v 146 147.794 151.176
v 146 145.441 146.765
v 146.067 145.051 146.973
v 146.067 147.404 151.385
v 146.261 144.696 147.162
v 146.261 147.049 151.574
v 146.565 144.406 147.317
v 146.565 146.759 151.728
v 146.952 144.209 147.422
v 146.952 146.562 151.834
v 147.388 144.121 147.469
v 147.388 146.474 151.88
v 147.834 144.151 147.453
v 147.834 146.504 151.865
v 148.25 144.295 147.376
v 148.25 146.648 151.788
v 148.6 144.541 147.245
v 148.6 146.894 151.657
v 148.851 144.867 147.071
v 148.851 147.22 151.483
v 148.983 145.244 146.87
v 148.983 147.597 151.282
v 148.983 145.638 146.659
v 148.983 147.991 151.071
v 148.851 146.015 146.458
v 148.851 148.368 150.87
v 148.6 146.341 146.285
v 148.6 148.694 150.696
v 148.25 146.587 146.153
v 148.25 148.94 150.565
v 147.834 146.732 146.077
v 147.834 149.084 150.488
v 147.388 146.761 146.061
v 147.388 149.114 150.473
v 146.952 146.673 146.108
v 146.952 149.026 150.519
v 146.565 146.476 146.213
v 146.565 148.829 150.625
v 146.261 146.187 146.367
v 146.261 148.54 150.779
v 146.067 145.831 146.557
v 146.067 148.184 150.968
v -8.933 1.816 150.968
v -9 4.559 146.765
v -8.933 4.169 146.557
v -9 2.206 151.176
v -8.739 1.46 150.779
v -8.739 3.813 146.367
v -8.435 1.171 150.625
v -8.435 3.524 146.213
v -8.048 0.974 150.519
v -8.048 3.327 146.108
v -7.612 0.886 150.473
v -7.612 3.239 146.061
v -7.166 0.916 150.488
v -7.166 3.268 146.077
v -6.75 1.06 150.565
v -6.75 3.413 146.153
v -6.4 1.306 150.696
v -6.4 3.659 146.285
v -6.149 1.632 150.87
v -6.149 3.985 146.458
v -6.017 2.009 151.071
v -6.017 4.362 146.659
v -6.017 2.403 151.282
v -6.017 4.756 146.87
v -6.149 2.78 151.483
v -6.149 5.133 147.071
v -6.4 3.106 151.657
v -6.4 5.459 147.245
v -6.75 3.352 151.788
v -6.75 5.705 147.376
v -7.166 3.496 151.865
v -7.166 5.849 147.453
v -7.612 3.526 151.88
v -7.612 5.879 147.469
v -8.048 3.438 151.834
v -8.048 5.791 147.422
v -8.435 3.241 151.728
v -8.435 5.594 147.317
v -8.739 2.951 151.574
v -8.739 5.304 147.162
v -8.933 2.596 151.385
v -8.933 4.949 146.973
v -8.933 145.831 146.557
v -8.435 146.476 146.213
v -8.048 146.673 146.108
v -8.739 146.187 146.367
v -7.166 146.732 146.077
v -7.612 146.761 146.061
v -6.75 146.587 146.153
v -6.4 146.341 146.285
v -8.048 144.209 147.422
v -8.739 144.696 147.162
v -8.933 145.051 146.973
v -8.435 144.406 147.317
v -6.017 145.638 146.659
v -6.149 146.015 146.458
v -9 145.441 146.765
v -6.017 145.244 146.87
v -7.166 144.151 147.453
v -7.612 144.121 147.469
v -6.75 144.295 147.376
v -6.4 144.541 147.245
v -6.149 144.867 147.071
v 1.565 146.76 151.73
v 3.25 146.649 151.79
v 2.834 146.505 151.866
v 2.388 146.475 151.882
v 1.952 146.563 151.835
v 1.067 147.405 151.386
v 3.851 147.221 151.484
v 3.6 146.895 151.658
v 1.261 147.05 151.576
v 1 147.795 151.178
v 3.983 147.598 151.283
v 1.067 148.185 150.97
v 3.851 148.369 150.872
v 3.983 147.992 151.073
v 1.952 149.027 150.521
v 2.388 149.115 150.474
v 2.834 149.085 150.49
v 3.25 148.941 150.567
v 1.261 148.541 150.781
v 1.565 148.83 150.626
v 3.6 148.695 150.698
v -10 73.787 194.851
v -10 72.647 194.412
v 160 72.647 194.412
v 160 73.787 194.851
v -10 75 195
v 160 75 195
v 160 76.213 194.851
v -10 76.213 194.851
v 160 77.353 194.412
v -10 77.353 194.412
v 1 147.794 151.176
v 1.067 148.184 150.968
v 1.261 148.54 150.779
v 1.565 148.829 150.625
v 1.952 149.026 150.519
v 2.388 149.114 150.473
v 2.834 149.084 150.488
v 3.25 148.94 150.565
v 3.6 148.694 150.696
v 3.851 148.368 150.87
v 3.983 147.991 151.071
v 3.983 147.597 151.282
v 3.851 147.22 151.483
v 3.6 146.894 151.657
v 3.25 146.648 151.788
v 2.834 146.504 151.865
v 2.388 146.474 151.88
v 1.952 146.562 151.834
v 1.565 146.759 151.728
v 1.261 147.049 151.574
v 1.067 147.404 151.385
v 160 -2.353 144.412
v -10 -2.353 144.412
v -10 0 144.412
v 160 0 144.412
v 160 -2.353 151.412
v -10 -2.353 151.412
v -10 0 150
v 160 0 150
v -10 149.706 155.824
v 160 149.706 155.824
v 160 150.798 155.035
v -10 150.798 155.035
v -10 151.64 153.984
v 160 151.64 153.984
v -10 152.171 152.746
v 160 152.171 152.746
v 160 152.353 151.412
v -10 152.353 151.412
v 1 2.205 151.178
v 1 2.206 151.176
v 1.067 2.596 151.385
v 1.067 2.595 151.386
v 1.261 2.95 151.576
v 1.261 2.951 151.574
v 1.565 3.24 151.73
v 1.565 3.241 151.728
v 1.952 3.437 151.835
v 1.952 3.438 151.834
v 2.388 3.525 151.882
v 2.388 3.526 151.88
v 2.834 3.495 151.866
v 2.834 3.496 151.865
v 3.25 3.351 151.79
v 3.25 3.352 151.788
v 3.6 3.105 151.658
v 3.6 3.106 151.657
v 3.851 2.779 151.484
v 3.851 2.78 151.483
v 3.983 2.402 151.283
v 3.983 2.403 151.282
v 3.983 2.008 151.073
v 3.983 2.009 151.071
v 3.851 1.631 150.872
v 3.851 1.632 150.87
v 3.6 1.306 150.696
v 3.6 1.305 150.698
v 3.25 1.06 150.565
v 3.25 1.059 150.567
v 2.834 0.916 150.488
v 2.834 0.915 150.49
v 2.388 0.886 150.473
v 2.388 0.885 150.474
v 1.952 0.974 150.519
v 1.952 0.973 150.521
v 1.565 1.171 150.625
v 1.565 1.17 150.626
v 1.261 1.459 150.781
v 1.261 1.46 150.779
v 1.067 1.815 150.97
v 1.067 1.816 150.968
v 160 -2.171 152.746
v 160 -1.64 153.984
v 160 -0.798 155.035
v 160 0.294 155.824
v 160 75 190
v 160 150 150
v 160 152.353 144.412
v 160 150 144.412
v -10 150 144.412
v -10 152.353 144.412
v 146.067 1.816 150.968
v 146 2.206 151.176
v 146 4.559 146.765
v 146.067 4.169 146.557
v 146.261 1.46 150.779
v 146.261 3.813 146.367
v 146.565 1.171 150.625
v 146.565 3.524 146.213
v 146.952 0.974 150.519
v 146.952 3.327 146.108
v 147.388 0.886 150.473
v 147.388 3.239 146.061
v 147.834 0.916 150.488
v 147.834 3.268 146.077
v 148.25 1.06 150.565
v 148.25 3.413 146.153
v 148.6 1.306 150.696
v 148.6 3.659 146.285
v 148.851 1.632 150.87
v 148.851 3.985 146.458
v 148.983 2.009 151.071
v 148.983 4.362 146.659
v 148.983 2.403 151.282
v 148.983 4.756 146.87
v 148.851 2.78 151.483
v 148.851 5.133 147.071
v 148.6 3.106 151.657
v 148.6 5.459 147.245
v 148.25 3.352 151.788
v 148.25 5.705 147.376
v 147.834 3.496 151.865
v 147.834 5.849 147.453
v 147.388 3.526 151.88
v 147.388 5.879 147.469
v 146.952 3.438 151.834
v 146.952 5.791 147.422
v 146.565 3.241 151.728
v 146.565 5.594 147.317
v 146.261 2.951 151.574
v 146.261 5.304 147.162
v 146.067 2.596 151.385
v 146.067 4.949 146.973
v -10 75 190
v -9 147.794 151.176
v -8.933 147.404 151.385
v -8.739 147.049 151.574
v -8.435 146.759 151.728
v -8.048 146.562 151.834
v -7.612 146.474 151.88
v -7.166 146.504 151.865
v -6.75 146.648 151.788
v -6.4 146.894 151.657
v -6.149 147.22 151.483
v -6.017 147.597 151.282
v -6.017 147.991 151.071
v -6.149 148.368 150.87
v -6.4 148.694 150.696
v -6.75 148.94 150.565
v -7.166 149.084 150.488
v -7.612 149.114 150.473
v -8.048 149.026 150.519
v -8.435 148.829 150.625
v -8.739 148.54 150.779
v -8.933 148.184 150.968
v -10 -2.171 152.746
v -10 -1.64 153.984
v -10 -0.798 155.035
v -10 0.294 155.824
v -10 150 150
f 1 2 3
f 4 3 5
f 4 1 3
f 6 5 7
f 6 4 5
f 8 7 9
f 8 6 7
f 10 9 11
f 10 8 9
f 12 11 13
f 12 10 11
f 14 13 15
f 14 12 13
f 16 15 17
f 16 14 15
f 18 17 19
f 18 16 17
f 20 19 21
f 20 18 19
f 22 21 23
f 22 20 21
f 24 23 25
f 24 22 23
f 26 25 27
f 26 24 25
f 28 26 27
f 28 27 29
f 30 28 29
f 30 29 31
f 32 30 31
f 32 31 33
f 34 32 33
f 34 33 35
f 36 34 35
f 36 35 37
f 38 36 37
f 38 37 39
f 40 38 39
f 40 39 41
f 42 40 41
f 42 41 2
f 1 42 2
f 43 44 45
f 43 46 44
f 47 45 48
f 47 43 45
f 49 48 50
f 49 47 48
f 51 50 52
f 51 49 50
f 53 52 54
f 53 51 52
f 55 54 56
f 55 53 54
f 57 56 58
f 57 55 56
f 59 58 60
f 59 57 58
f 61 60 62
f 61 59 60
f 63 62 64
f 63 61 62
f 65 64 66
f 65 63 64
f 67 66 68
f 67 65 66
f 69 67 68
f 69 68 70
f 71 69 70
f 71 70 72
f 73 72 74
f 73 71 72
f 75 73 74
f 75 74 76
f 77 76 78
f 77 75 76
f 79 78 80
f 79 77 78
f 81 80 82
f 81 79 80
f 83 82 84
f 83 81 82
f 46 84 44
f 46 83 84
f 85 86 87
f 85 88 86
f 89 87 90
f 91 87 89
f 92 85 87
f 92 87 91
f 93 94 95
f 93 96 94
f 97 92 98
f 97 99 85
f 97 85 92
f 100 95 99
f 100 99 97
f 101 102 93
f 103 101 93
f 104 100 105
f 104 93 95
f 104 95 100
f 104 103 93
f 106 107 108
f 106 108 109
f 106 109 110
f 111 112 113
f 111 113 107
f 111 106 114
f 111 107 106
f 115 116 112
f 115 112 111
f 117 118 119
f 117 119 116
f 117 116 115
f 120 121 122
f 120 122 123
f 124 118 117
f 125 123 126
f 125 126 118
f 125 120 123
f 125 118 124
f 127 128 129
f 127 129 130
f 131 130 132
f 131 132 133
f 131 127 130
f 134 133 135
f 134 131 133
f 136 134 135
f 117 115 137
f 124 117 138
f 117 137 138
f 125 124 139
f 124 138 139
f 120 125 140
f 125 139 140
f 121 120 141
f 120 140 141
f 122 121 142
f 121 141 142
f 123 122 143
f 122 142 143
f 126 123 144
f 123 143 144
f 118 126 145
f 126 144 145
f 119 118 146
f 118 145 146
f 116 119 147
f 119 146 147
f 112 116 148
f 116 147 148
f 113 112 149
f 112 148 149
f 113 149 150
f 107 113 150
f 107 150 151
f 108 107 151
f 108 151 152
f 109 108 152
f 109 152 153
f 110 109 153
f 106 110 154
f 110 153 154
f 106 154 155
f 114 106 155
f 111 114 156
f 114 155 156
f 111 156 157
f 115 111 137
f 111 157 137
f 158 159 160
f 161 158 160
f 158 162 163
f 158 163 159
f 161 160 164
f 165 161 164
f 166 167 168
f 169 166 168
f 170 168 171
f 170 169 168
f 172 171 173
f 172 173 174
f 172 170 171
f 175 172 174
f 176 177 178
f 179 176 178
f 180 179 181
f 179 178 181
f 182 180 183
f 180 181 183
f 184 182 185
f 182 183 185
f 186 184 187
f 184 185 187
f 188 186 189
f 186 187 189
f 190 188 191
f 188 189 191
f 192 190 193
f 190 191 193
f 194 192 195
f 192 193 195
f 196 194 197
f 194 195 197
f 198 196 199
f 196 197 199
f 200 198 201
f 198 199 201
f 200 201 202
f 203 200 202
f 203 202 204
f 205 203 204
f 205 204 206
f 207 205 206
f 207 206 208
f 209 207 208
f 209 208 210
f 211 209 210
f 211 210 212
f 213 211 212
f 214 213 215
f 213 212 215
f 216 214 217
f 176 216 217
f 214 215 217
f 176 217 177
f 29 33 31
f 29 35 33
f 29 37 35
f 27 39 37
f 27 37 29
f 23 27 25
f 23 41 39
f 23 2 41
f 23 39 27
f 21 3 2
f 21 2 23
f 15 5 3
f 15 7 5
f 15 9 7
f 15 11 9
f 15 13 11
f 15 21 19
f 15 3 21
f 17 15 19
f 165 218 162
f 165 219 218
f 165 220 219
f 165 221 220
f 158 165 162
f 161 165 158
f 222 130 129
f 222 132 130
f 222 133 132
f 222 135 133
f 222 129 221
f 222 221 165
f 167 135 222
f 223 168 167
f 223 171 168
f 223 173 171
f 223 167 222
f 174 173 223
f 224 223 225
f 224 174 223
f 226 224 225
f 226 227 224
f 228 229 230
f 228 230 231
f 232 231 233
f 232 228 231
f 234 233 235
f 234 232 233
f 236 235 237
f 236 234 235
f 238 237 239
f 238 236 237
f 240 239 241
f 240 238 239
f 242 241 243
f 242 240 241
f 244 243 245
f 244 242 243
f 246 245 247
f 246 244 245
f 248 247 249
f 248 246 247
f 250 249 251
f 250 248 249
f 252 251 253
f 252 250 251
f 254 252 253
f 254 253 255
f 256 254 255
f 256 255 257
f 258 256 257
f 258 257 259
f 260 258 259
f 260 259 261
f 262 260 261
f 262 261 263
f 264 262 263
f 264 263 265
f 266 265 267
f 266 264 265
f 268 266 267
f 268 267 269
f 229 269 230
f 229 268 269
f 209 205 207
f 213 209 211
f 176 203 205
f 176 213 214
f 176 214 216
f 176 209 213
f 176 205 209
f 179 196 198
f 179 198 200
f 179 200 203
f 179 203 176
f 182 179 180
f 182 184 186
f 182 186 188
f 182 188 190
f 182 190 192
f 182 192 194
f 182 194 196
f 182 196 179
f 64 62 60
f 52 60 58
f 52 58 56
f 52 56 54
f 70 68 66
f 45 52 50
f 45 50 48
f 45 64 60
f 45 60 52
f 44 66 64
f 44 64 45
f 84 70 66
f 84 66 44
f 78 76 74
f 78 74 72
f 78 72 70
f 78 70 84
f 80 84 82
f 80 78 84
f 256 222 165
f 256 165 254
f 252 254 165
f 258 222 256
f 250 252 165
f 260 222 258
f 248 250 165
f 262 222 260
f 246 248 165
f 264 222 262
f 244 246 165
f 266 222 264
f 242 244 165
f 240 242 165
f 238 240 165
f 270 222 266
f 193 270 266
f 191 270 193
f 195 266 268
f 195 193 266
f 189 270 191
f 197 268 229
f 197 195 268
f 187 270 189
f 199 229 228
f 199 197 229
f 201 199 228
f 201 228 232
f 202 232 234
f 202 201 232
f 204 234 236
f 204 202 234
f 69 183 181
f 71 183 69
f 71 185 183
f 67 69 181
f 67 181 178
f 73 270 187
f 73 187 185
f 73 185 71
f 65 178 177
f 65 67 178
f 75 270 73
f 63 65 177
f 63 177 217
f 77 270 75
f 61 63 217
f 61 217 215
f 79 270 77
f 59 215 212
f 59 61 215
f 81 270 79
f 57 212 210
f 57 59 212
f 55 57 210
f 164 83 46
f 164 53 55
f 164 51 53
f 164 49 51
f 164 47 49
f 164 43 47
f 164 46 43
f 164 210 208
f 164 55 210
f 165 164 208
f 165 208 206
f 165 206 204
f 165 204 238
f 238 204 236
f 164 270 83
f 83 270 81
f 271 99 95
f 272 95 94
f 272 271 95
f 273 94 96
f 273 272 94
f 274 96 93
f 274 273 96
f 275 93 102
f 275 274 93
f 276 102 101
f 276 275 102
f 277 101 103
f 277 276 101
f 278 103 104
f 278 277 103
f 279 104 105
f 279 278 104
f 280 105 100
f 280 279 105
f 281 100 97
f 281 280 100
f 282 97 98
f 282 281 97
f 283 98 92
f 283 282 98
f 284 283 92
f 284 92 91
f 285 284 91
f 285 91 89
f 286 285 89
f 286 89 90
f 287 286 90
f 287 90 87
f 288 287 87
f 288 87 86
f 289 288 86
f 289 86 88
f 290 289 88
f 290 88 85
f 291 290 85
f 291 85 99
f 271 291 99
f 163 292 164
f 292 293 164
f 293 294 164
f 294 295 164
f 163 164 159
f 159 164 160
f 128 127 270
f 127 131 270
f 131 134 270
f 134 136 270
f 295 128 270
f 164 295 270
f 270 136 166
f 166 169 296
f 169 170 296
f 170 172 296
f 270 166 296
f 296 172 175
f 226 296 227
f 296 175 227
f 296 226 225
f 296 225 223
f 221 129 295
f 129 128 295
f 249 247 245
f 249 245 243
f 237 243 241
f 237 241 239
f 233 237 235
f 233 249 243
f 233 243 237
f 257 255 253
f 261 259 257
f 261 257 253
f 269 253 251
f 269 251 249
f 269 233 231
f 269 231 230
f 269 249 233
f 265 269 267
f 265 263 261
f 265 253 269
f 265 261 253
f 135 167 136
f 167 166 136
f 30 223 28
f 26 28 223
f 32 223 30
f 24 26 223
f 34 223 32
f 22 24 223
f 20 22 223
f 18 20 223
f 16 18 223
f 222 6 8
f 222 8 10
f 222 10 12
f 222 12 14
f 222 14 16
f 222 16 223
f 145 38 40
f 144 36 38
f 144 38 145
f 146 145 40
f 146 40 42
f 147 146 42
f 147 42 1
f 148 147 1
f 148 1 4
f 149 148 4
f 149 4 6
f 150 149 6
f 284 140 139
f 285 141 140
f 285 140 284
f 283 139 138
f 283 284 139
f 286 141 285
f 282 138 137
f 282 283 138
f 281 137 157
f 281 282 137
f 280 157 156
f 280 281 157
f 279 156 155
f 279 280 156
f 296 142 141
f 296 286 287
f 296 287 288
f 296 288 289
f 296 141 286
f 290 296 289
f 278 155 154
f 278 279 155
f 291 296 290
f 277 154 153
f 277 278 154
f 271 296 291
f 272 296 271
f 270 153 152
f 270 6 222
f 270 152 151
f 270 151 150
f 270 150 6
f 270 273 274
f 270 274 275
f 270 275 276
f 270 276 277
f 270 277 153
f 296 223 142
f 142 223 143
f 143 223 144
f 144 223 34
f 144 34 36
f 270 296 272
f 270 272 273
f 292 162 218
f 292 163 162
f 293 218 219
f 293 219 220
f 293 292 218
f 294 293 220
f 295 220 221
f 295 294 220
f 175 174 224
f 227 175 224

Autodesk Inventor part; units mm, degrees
sketch "Boceto1" plane through (0, 0, 0) normal (0, 0, 1) x (1, 0, 0)
  line L0 (0, 0) -> (150, 0)
  line L1 (150, 0) -> (150, 150)
  line L2 (150, 150) -> (0, 150)
  line L3 (0, 150) -> (0, 0)
  line L4 (5, 145) -> (145, 145)
  line L5 (145, 145) -> (145, 5)
  line L6 (145, 5) -> (5, 5)
  line L7 (5, 5) -> (5, 145)
  dimension "d0" = 150
  dimension "d1" = 150
  dimension "d2" = 5
extrude "Extrusión1" add sketch "Boceto1" along normal blind 150
sketch "Boceto2" plane through (150, 0, 0) normal (1, 0, 0) x (0, 0, -1)
  line L0 (-150, 0) -> (-150, 150) projected
  line L1 (-150, 75) -> (-190, 75) construction
  line L2 (-190, 75) -> (-150, 150)
  line L3 (0, 0) -> (-150, 0) construction
  line L4 (-150, 0) -> (-190, 75)
  dimension "d5" = 40
extrude "Extrusión2" add sketch "Boceto2" against normal blind 5
ref_plane "Plano de trabajo1" through (75, 0, 0) normal (1, 0, 0) x (0, 0, -1)
mirror "Simetría1" about plane through (75, 0, 0) normal (1, 0, 0) of "Extrusión2"
sketch "Boceto3" plane through (0, 150, 0) normal (0, 1, 0) x (1, 0, 0)
  line L0 (105, -60) -> (45, -60)
  line L1 (45, -60) -> (45, -95)
  line L2 (60, -110) -> (90, -110)
  line L3 (105, -95) -> (105, -60)
  line L4 (150, 0) -> (0, 0) projected
  line L5 (145, -150) -> (5, -150) projected
  arc A0 (90, -110) -> (105, -95) centre (90, -95) ccw
  arc A1 (45, -95) -> (60, -110) centre (60, -95) ccw
  point P0 (45, -110)
  point P1 (105, -110)
  point P2 (75, -60)
  point P3 (75, 0)
  dimension "d8" = 60
  dimension "d9" = 50
  dimension "d10" = 40
  dimension "d11" = 15
extrude "Extrusión3" cut sketch "Boceto3" against normal through all
sketch "Boceto4" plane through (150, 0, 0) normal (1, 0, 0) x (0, 0, -1)
  line L0 (-13, 20) -> (-123, 20)
  line L1 (-128, 25) -> (-128, 75)
  line L2 (-123, 80) -> (-13, 80)
  line L3 (-8, 75) -> (-8, 25)
  line L4 (0, 0) -> (0, 150) projected
  line L5 (0, 0) -> (-150, 0) projected
  arc A0 (-123, 80) -> (-128, 75) centre (-123, 75) ccw
  arc A1 (-8, 75) -> (-13, 80) centre (-13, 75) ccw
  arc A2 (-13, 20) -> (-8, 25) centre (-13, 25) ccw
  arc A3 (-128, 25) -> (-123, 20) centre (-123, 25) ccw
  point P0 (-128, 80)
  point P1 (-128, 20)
  point P2 (-8, 80)
  dimension "d14" = 120
  dimension "d15" = 60
  dimension "d16" = 8
  dimension "d17" = 20
  dimension "d18" = 5
extrude "Extrusión4" cut sketch "Boceto4" against normal up to surface (5 mm away)
sketch "Boceto5" plane through (0, 0, 0) normal (-1, 0, 0) x (0, 0, 1)
  line L0 (65, 125) -> (115, 125)
  line L1 (120, 120) -> (120, 30)
  line L2 (115, 25) -> (65, 25)
  line L3 (60, 30) -> (60, 120)
  line L4 (0, 150) -> (0, 0) projected
  arc A0 (120, 120) -> (115, 125) centre (115, 120) ccw
  arc A1 (115, 25) -> (120, 30) centre (115, 30) ccw
  arc A2 (65, 125) -> (60, 120) centre (65, 120) ccw
  arc A3 (60, 30) -> (65, 25) centre (65, 30) ccw
  point P0 (60, 150)
  point P1 (120, 25)
  point P2 (120, 125)
  point P3 (60, 25)
  point P4 (60, 75)
  point P5 (0, 75)
  dimension "d21" = 60
  dimension "d22" = 100
  dimension "d23" = 60
  dimension "d24" = 5
extrude "Extrusión5" cut sketch "Boceto5" against normal blind 10
sketch "Boceto6" plane through (150, 0, 0) normal (1, 0, 0) x (0, 0, -1)
  line L0 (-190, 75) -> (-150, 0) projected
  line L1 (-150, 150) -> (-190, 75) projected
  line L2 (-154.4118, 152.3529) -> (-195.6667, 75)
  line L3 (-195.6667, 75) -> (-154.4118, -2.3529)
  line L4 (-154.4118, 152.3529) -> (-144.4118, 152.3529)
  line L5 (-144.4118, 152.3529) -> (-144.4118, 150)
  line L6 (-154.4118, -2.3529) -> (-144.4118, -2.3529)
  line L7 (-144.4118, -2.3529) -> (-144.4118, 0)
  line L8 (0, 0) -> (-150, 0) projected
  line L9 (0, 150) -> (-150, 150) projected
  dimension "d27" = 5
  dimension "d28" = 10
extrude "Extrusión6" add sketch "Boceto6" along normal blind 10 and the other way blind 160
fillet "Empalme1" radius 5 3 edges at (75, 152.3529, 154.4118) (75, 75, 195.6667) (75, -2.3529, 154.4118)
sketch "Boceto8" plane through (150, 0, 0) normal (1, 0, 0) x (0, 0, -1)
  arc A0 (-13, 20) -> (-8, 25) centre (-13, 25) ccw projected
  line L0 (-13, 20) -> (-123, 20) projected
  arc A1 (-128, 25) -> (-123, 20) centre (-123, 25) ccw projected
  line L1 (-128, 25) -> (-128, 75) projected
  arc A2 (-123, 80) -> (-128, 75) centre (-123, 75) ccw projected
  line L2 (-123, 80) -> (-13, 80) projected
  arc A3 (-8, 75) -> (-13, 80) centre (-13, 75) ccw projected
  line L3 (-8, 75) -> (-8, 25) projected
  line L4 (0, 0) -> (0, 150) projected
  line L5 (0, 150) -> (-144.4118, 150) projected
  line L6 (-144.4118, 150) -> (-150, 150) projected
  line L7 (-150, 150) -> (-190, 75) projected
  line L8 (-190, 75) -> (-150, 0) projected
  line L9 (-144.4118, 0) -> (-150, 0) projected
  line L10 (0, 0) -> (-144.4118, 0) projected
  point P0 (0, 0)
extrude "Extrusión8" cut sketch "Boceto8" against normal through all contours L0 A1 L1 A2 L2 A3 L3 A0 | L10 L9 L8 L7 L6 L5 L4
sketch "Boceto9" plane through (160, 0, 150) normal (0, 0.4705882, -0.8823529) x (-1, 0, 0)
  circle A0 centre (12.5, 2.5) radius 1.5
  line L0 (0, 0) -> (0, 85) projected
  line L1 (170, 0) -> (0, 0) projected
  point P0 (160, -70.5882)
  dimension "d41" = 3
  dimension "d42" = 12.5
  dimension "d43" = 2.5
extrude "Extrusión9" add sketch "Boceto9" along normal blind 5
ref_plane "Plano de trabajo3" through (75, 0, 0) normal (1, 0, 0) x (0, 0, -1)
mirror "Simetría3" about plane through (75, 0, 0) normal (1, 0, 0) of "Extrusión9"
ref_plane "Plano de trabajo5" through (-10, 75, 144.4118) normal (0, -1, 0) x (1, 0, 0)
mirror "Simetría4" about plane through (-10, 75, 144.4118) normal (0, -1, 0) of "Extrusión9", "Simetría3"
sketch "Boceto10" plane through (160, 0, 150) normal (0, 0.4705882, -0.8823529) x (-1, 0, 0)
  circle A0 centre (167.5, 2.5) radius 1.5
  line L0 (170, 0) -> (0, 0) projected
  line L1 (170, 85) -> (170, 0) projected
  line L2 (0, 85) -> (170, 85) projected
  point P0 (160, -70.5882)
  dimension "d46" = 3
  dimension "d47" = 2.5
  dimension "d48" = 2.5
extrude "Extrusión10" add sketch "Boceto10" along normal blind 5
mirror "Simetría5" about plane through (-10, 75, 144.4118) normal (0, -1, 0) of "Extrusión10"
sketch "Boceto11" plane through (2.5, 4.5588, 146.7647) normal (0, 0.4705882, -0.8823529) x (-1, 0, 0)
  circle A0 centre (0, 0) radius 1.5 projected
  point P0 (2.5, -73.0882)
extrude "Extrusión11" cut sketch "Boceto11" against normal blind 5
sketch "Boceto12" plane through (2.5, 145.4412, 146.7647) normal (0, -0.4705882, -0.8823529) x (-1, 0, 0)
  circle A0 centre (0, 0) radius 1.5 projected
  point P0 (2.5, -59.2647)
extrude "Extrusión12" cut sketch "Boceto12" against normal blind 5
properties part number "TechoCasa" material "Plástico ABS"
